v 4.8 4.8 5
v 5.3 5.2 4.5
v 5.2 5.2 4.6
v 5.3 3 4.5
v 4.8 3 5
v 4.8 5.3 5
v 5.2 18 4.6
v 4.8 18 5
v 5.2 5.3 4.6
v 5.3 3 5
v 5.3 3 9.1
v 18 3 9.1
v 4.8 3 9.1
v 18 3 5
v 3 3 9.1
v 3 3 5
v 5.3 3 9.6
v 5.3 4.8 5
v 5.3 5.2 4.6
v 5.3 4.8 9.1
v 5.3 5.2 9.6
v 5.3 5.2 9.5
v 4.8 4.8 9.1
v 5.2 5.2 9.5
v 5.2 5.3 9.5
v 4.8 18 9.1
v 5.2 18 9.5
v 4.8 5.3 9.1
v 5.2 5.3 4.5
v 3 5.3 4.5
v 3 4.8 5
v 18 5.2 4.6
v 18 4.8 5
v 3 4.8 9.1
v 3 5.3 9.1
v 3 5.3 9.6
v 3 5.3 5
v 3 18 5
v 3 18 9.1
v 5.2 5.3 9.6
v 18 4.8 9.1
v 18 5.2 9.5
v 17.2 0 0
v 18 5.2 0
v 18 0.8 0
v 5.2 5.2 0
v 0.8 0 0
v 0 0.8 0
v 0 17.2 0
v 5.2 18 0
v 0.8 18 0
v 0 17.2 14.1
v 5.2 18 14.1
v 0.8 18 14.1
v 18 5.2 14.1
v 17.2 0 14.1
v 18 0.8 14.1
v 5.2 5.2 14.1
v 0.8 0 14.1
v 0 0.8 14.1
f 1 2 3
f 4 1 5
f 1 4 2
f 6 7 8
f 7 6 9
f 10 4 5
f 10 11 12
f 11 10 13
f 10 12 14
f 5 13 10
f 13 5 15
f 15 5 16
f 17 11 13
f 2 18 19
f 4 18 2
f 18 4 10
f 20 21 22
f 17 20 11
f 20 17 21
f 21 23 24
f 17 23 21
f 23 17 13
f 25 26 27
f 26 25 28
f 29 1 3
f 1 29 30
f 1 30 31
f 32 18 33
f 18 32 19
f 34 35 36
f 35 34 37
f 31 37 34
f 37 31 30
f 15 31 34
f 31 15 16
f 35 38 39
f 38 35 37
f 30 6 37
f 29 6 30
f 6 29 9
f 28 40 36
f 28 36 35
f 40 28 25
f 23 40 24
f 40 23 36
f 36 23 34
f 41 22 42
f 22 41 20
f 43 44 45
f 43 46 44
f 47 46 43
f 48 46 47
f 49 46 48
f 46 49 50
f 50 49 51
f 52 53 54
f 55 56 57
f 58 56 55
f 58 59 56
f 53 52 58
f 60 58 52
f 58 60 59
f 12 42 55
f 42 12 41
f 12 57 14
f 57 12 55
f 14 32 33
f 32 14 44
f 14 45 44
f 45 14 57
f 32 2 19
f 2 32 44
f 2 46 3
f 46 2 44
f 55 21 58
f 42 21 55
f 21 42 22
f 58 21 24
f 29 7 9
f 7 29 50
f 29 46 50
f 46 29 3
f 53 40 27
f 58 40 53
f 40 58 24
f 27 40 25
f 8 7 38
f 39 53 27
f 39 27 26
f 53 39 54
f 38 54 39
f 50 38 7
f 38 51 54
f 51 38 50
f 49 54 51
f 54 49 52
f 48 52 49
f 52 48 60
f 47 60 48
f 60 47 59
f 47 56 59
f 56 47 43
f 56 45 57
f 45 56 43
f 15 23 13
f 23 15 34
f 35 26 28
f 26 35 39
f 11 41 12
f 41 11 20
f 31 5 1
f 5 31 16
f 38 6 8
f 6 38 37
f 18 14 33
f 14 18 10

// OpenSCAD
// Millimetres. arm = length along each PCB edge, excluding wall.
overlap = 2.2;
slot = 4.1;
top = 5;
bottom = 5;
arm = 15;
wall = 3;
mode = "single"; // "single" or "four"
c = min(0.8, wall/3, arm/10);
e = min(0.4, overlap/4, bottom/4, top/4);
eps = min(0.1, e/2);
h = bottom + slot + top;
assert(min(overlap,slot,top,bottom,arm,wall)>=0.2);
assert(arm>overlap);
module relief(poly) {
    translate([0,arm+eps,0]) rotate([90,0,0])
        linear_extrude(height=arm+eps) polygon(poly);
}
module cuts() {
    relief([[overlap-e,bottom],[overlap+eps,bottom-e-eps],
            [overlap+eps,bottom+eps],[overlap-e,bottom+eps]]);
    relief([[overlap-e,bottom+slot-eps],[overlap+eps,bottom+slot-eps],
            [overlap+eps,bottom+slot+e+eps],[overlap-e,bottom+slot]]);
}
module corner() {
    translate([wall,wall,0]) difference() {
        linear_extrude(height=h) polygon([
            [-wall+c,-wall],[arm-c,-wall],[arm,-wall+c],[arm,overlap],
            [overlap,overlap],[overlap,arm],[-wall+c,arm],
            [-wall,arm-c],[-wall,-wall+c]]);
        translate([0,0,bottom]) cube([arm+1,arm+1,slot]);
        cuts(); mirror([1,-1,0]) cuts();
    }
}
if(mode=="single") corner();
if(mode=="four") for(x=[0,arm+wall+6]) for(y=[0,arm+wall+6])
    translate([x,y,0]) corner();
